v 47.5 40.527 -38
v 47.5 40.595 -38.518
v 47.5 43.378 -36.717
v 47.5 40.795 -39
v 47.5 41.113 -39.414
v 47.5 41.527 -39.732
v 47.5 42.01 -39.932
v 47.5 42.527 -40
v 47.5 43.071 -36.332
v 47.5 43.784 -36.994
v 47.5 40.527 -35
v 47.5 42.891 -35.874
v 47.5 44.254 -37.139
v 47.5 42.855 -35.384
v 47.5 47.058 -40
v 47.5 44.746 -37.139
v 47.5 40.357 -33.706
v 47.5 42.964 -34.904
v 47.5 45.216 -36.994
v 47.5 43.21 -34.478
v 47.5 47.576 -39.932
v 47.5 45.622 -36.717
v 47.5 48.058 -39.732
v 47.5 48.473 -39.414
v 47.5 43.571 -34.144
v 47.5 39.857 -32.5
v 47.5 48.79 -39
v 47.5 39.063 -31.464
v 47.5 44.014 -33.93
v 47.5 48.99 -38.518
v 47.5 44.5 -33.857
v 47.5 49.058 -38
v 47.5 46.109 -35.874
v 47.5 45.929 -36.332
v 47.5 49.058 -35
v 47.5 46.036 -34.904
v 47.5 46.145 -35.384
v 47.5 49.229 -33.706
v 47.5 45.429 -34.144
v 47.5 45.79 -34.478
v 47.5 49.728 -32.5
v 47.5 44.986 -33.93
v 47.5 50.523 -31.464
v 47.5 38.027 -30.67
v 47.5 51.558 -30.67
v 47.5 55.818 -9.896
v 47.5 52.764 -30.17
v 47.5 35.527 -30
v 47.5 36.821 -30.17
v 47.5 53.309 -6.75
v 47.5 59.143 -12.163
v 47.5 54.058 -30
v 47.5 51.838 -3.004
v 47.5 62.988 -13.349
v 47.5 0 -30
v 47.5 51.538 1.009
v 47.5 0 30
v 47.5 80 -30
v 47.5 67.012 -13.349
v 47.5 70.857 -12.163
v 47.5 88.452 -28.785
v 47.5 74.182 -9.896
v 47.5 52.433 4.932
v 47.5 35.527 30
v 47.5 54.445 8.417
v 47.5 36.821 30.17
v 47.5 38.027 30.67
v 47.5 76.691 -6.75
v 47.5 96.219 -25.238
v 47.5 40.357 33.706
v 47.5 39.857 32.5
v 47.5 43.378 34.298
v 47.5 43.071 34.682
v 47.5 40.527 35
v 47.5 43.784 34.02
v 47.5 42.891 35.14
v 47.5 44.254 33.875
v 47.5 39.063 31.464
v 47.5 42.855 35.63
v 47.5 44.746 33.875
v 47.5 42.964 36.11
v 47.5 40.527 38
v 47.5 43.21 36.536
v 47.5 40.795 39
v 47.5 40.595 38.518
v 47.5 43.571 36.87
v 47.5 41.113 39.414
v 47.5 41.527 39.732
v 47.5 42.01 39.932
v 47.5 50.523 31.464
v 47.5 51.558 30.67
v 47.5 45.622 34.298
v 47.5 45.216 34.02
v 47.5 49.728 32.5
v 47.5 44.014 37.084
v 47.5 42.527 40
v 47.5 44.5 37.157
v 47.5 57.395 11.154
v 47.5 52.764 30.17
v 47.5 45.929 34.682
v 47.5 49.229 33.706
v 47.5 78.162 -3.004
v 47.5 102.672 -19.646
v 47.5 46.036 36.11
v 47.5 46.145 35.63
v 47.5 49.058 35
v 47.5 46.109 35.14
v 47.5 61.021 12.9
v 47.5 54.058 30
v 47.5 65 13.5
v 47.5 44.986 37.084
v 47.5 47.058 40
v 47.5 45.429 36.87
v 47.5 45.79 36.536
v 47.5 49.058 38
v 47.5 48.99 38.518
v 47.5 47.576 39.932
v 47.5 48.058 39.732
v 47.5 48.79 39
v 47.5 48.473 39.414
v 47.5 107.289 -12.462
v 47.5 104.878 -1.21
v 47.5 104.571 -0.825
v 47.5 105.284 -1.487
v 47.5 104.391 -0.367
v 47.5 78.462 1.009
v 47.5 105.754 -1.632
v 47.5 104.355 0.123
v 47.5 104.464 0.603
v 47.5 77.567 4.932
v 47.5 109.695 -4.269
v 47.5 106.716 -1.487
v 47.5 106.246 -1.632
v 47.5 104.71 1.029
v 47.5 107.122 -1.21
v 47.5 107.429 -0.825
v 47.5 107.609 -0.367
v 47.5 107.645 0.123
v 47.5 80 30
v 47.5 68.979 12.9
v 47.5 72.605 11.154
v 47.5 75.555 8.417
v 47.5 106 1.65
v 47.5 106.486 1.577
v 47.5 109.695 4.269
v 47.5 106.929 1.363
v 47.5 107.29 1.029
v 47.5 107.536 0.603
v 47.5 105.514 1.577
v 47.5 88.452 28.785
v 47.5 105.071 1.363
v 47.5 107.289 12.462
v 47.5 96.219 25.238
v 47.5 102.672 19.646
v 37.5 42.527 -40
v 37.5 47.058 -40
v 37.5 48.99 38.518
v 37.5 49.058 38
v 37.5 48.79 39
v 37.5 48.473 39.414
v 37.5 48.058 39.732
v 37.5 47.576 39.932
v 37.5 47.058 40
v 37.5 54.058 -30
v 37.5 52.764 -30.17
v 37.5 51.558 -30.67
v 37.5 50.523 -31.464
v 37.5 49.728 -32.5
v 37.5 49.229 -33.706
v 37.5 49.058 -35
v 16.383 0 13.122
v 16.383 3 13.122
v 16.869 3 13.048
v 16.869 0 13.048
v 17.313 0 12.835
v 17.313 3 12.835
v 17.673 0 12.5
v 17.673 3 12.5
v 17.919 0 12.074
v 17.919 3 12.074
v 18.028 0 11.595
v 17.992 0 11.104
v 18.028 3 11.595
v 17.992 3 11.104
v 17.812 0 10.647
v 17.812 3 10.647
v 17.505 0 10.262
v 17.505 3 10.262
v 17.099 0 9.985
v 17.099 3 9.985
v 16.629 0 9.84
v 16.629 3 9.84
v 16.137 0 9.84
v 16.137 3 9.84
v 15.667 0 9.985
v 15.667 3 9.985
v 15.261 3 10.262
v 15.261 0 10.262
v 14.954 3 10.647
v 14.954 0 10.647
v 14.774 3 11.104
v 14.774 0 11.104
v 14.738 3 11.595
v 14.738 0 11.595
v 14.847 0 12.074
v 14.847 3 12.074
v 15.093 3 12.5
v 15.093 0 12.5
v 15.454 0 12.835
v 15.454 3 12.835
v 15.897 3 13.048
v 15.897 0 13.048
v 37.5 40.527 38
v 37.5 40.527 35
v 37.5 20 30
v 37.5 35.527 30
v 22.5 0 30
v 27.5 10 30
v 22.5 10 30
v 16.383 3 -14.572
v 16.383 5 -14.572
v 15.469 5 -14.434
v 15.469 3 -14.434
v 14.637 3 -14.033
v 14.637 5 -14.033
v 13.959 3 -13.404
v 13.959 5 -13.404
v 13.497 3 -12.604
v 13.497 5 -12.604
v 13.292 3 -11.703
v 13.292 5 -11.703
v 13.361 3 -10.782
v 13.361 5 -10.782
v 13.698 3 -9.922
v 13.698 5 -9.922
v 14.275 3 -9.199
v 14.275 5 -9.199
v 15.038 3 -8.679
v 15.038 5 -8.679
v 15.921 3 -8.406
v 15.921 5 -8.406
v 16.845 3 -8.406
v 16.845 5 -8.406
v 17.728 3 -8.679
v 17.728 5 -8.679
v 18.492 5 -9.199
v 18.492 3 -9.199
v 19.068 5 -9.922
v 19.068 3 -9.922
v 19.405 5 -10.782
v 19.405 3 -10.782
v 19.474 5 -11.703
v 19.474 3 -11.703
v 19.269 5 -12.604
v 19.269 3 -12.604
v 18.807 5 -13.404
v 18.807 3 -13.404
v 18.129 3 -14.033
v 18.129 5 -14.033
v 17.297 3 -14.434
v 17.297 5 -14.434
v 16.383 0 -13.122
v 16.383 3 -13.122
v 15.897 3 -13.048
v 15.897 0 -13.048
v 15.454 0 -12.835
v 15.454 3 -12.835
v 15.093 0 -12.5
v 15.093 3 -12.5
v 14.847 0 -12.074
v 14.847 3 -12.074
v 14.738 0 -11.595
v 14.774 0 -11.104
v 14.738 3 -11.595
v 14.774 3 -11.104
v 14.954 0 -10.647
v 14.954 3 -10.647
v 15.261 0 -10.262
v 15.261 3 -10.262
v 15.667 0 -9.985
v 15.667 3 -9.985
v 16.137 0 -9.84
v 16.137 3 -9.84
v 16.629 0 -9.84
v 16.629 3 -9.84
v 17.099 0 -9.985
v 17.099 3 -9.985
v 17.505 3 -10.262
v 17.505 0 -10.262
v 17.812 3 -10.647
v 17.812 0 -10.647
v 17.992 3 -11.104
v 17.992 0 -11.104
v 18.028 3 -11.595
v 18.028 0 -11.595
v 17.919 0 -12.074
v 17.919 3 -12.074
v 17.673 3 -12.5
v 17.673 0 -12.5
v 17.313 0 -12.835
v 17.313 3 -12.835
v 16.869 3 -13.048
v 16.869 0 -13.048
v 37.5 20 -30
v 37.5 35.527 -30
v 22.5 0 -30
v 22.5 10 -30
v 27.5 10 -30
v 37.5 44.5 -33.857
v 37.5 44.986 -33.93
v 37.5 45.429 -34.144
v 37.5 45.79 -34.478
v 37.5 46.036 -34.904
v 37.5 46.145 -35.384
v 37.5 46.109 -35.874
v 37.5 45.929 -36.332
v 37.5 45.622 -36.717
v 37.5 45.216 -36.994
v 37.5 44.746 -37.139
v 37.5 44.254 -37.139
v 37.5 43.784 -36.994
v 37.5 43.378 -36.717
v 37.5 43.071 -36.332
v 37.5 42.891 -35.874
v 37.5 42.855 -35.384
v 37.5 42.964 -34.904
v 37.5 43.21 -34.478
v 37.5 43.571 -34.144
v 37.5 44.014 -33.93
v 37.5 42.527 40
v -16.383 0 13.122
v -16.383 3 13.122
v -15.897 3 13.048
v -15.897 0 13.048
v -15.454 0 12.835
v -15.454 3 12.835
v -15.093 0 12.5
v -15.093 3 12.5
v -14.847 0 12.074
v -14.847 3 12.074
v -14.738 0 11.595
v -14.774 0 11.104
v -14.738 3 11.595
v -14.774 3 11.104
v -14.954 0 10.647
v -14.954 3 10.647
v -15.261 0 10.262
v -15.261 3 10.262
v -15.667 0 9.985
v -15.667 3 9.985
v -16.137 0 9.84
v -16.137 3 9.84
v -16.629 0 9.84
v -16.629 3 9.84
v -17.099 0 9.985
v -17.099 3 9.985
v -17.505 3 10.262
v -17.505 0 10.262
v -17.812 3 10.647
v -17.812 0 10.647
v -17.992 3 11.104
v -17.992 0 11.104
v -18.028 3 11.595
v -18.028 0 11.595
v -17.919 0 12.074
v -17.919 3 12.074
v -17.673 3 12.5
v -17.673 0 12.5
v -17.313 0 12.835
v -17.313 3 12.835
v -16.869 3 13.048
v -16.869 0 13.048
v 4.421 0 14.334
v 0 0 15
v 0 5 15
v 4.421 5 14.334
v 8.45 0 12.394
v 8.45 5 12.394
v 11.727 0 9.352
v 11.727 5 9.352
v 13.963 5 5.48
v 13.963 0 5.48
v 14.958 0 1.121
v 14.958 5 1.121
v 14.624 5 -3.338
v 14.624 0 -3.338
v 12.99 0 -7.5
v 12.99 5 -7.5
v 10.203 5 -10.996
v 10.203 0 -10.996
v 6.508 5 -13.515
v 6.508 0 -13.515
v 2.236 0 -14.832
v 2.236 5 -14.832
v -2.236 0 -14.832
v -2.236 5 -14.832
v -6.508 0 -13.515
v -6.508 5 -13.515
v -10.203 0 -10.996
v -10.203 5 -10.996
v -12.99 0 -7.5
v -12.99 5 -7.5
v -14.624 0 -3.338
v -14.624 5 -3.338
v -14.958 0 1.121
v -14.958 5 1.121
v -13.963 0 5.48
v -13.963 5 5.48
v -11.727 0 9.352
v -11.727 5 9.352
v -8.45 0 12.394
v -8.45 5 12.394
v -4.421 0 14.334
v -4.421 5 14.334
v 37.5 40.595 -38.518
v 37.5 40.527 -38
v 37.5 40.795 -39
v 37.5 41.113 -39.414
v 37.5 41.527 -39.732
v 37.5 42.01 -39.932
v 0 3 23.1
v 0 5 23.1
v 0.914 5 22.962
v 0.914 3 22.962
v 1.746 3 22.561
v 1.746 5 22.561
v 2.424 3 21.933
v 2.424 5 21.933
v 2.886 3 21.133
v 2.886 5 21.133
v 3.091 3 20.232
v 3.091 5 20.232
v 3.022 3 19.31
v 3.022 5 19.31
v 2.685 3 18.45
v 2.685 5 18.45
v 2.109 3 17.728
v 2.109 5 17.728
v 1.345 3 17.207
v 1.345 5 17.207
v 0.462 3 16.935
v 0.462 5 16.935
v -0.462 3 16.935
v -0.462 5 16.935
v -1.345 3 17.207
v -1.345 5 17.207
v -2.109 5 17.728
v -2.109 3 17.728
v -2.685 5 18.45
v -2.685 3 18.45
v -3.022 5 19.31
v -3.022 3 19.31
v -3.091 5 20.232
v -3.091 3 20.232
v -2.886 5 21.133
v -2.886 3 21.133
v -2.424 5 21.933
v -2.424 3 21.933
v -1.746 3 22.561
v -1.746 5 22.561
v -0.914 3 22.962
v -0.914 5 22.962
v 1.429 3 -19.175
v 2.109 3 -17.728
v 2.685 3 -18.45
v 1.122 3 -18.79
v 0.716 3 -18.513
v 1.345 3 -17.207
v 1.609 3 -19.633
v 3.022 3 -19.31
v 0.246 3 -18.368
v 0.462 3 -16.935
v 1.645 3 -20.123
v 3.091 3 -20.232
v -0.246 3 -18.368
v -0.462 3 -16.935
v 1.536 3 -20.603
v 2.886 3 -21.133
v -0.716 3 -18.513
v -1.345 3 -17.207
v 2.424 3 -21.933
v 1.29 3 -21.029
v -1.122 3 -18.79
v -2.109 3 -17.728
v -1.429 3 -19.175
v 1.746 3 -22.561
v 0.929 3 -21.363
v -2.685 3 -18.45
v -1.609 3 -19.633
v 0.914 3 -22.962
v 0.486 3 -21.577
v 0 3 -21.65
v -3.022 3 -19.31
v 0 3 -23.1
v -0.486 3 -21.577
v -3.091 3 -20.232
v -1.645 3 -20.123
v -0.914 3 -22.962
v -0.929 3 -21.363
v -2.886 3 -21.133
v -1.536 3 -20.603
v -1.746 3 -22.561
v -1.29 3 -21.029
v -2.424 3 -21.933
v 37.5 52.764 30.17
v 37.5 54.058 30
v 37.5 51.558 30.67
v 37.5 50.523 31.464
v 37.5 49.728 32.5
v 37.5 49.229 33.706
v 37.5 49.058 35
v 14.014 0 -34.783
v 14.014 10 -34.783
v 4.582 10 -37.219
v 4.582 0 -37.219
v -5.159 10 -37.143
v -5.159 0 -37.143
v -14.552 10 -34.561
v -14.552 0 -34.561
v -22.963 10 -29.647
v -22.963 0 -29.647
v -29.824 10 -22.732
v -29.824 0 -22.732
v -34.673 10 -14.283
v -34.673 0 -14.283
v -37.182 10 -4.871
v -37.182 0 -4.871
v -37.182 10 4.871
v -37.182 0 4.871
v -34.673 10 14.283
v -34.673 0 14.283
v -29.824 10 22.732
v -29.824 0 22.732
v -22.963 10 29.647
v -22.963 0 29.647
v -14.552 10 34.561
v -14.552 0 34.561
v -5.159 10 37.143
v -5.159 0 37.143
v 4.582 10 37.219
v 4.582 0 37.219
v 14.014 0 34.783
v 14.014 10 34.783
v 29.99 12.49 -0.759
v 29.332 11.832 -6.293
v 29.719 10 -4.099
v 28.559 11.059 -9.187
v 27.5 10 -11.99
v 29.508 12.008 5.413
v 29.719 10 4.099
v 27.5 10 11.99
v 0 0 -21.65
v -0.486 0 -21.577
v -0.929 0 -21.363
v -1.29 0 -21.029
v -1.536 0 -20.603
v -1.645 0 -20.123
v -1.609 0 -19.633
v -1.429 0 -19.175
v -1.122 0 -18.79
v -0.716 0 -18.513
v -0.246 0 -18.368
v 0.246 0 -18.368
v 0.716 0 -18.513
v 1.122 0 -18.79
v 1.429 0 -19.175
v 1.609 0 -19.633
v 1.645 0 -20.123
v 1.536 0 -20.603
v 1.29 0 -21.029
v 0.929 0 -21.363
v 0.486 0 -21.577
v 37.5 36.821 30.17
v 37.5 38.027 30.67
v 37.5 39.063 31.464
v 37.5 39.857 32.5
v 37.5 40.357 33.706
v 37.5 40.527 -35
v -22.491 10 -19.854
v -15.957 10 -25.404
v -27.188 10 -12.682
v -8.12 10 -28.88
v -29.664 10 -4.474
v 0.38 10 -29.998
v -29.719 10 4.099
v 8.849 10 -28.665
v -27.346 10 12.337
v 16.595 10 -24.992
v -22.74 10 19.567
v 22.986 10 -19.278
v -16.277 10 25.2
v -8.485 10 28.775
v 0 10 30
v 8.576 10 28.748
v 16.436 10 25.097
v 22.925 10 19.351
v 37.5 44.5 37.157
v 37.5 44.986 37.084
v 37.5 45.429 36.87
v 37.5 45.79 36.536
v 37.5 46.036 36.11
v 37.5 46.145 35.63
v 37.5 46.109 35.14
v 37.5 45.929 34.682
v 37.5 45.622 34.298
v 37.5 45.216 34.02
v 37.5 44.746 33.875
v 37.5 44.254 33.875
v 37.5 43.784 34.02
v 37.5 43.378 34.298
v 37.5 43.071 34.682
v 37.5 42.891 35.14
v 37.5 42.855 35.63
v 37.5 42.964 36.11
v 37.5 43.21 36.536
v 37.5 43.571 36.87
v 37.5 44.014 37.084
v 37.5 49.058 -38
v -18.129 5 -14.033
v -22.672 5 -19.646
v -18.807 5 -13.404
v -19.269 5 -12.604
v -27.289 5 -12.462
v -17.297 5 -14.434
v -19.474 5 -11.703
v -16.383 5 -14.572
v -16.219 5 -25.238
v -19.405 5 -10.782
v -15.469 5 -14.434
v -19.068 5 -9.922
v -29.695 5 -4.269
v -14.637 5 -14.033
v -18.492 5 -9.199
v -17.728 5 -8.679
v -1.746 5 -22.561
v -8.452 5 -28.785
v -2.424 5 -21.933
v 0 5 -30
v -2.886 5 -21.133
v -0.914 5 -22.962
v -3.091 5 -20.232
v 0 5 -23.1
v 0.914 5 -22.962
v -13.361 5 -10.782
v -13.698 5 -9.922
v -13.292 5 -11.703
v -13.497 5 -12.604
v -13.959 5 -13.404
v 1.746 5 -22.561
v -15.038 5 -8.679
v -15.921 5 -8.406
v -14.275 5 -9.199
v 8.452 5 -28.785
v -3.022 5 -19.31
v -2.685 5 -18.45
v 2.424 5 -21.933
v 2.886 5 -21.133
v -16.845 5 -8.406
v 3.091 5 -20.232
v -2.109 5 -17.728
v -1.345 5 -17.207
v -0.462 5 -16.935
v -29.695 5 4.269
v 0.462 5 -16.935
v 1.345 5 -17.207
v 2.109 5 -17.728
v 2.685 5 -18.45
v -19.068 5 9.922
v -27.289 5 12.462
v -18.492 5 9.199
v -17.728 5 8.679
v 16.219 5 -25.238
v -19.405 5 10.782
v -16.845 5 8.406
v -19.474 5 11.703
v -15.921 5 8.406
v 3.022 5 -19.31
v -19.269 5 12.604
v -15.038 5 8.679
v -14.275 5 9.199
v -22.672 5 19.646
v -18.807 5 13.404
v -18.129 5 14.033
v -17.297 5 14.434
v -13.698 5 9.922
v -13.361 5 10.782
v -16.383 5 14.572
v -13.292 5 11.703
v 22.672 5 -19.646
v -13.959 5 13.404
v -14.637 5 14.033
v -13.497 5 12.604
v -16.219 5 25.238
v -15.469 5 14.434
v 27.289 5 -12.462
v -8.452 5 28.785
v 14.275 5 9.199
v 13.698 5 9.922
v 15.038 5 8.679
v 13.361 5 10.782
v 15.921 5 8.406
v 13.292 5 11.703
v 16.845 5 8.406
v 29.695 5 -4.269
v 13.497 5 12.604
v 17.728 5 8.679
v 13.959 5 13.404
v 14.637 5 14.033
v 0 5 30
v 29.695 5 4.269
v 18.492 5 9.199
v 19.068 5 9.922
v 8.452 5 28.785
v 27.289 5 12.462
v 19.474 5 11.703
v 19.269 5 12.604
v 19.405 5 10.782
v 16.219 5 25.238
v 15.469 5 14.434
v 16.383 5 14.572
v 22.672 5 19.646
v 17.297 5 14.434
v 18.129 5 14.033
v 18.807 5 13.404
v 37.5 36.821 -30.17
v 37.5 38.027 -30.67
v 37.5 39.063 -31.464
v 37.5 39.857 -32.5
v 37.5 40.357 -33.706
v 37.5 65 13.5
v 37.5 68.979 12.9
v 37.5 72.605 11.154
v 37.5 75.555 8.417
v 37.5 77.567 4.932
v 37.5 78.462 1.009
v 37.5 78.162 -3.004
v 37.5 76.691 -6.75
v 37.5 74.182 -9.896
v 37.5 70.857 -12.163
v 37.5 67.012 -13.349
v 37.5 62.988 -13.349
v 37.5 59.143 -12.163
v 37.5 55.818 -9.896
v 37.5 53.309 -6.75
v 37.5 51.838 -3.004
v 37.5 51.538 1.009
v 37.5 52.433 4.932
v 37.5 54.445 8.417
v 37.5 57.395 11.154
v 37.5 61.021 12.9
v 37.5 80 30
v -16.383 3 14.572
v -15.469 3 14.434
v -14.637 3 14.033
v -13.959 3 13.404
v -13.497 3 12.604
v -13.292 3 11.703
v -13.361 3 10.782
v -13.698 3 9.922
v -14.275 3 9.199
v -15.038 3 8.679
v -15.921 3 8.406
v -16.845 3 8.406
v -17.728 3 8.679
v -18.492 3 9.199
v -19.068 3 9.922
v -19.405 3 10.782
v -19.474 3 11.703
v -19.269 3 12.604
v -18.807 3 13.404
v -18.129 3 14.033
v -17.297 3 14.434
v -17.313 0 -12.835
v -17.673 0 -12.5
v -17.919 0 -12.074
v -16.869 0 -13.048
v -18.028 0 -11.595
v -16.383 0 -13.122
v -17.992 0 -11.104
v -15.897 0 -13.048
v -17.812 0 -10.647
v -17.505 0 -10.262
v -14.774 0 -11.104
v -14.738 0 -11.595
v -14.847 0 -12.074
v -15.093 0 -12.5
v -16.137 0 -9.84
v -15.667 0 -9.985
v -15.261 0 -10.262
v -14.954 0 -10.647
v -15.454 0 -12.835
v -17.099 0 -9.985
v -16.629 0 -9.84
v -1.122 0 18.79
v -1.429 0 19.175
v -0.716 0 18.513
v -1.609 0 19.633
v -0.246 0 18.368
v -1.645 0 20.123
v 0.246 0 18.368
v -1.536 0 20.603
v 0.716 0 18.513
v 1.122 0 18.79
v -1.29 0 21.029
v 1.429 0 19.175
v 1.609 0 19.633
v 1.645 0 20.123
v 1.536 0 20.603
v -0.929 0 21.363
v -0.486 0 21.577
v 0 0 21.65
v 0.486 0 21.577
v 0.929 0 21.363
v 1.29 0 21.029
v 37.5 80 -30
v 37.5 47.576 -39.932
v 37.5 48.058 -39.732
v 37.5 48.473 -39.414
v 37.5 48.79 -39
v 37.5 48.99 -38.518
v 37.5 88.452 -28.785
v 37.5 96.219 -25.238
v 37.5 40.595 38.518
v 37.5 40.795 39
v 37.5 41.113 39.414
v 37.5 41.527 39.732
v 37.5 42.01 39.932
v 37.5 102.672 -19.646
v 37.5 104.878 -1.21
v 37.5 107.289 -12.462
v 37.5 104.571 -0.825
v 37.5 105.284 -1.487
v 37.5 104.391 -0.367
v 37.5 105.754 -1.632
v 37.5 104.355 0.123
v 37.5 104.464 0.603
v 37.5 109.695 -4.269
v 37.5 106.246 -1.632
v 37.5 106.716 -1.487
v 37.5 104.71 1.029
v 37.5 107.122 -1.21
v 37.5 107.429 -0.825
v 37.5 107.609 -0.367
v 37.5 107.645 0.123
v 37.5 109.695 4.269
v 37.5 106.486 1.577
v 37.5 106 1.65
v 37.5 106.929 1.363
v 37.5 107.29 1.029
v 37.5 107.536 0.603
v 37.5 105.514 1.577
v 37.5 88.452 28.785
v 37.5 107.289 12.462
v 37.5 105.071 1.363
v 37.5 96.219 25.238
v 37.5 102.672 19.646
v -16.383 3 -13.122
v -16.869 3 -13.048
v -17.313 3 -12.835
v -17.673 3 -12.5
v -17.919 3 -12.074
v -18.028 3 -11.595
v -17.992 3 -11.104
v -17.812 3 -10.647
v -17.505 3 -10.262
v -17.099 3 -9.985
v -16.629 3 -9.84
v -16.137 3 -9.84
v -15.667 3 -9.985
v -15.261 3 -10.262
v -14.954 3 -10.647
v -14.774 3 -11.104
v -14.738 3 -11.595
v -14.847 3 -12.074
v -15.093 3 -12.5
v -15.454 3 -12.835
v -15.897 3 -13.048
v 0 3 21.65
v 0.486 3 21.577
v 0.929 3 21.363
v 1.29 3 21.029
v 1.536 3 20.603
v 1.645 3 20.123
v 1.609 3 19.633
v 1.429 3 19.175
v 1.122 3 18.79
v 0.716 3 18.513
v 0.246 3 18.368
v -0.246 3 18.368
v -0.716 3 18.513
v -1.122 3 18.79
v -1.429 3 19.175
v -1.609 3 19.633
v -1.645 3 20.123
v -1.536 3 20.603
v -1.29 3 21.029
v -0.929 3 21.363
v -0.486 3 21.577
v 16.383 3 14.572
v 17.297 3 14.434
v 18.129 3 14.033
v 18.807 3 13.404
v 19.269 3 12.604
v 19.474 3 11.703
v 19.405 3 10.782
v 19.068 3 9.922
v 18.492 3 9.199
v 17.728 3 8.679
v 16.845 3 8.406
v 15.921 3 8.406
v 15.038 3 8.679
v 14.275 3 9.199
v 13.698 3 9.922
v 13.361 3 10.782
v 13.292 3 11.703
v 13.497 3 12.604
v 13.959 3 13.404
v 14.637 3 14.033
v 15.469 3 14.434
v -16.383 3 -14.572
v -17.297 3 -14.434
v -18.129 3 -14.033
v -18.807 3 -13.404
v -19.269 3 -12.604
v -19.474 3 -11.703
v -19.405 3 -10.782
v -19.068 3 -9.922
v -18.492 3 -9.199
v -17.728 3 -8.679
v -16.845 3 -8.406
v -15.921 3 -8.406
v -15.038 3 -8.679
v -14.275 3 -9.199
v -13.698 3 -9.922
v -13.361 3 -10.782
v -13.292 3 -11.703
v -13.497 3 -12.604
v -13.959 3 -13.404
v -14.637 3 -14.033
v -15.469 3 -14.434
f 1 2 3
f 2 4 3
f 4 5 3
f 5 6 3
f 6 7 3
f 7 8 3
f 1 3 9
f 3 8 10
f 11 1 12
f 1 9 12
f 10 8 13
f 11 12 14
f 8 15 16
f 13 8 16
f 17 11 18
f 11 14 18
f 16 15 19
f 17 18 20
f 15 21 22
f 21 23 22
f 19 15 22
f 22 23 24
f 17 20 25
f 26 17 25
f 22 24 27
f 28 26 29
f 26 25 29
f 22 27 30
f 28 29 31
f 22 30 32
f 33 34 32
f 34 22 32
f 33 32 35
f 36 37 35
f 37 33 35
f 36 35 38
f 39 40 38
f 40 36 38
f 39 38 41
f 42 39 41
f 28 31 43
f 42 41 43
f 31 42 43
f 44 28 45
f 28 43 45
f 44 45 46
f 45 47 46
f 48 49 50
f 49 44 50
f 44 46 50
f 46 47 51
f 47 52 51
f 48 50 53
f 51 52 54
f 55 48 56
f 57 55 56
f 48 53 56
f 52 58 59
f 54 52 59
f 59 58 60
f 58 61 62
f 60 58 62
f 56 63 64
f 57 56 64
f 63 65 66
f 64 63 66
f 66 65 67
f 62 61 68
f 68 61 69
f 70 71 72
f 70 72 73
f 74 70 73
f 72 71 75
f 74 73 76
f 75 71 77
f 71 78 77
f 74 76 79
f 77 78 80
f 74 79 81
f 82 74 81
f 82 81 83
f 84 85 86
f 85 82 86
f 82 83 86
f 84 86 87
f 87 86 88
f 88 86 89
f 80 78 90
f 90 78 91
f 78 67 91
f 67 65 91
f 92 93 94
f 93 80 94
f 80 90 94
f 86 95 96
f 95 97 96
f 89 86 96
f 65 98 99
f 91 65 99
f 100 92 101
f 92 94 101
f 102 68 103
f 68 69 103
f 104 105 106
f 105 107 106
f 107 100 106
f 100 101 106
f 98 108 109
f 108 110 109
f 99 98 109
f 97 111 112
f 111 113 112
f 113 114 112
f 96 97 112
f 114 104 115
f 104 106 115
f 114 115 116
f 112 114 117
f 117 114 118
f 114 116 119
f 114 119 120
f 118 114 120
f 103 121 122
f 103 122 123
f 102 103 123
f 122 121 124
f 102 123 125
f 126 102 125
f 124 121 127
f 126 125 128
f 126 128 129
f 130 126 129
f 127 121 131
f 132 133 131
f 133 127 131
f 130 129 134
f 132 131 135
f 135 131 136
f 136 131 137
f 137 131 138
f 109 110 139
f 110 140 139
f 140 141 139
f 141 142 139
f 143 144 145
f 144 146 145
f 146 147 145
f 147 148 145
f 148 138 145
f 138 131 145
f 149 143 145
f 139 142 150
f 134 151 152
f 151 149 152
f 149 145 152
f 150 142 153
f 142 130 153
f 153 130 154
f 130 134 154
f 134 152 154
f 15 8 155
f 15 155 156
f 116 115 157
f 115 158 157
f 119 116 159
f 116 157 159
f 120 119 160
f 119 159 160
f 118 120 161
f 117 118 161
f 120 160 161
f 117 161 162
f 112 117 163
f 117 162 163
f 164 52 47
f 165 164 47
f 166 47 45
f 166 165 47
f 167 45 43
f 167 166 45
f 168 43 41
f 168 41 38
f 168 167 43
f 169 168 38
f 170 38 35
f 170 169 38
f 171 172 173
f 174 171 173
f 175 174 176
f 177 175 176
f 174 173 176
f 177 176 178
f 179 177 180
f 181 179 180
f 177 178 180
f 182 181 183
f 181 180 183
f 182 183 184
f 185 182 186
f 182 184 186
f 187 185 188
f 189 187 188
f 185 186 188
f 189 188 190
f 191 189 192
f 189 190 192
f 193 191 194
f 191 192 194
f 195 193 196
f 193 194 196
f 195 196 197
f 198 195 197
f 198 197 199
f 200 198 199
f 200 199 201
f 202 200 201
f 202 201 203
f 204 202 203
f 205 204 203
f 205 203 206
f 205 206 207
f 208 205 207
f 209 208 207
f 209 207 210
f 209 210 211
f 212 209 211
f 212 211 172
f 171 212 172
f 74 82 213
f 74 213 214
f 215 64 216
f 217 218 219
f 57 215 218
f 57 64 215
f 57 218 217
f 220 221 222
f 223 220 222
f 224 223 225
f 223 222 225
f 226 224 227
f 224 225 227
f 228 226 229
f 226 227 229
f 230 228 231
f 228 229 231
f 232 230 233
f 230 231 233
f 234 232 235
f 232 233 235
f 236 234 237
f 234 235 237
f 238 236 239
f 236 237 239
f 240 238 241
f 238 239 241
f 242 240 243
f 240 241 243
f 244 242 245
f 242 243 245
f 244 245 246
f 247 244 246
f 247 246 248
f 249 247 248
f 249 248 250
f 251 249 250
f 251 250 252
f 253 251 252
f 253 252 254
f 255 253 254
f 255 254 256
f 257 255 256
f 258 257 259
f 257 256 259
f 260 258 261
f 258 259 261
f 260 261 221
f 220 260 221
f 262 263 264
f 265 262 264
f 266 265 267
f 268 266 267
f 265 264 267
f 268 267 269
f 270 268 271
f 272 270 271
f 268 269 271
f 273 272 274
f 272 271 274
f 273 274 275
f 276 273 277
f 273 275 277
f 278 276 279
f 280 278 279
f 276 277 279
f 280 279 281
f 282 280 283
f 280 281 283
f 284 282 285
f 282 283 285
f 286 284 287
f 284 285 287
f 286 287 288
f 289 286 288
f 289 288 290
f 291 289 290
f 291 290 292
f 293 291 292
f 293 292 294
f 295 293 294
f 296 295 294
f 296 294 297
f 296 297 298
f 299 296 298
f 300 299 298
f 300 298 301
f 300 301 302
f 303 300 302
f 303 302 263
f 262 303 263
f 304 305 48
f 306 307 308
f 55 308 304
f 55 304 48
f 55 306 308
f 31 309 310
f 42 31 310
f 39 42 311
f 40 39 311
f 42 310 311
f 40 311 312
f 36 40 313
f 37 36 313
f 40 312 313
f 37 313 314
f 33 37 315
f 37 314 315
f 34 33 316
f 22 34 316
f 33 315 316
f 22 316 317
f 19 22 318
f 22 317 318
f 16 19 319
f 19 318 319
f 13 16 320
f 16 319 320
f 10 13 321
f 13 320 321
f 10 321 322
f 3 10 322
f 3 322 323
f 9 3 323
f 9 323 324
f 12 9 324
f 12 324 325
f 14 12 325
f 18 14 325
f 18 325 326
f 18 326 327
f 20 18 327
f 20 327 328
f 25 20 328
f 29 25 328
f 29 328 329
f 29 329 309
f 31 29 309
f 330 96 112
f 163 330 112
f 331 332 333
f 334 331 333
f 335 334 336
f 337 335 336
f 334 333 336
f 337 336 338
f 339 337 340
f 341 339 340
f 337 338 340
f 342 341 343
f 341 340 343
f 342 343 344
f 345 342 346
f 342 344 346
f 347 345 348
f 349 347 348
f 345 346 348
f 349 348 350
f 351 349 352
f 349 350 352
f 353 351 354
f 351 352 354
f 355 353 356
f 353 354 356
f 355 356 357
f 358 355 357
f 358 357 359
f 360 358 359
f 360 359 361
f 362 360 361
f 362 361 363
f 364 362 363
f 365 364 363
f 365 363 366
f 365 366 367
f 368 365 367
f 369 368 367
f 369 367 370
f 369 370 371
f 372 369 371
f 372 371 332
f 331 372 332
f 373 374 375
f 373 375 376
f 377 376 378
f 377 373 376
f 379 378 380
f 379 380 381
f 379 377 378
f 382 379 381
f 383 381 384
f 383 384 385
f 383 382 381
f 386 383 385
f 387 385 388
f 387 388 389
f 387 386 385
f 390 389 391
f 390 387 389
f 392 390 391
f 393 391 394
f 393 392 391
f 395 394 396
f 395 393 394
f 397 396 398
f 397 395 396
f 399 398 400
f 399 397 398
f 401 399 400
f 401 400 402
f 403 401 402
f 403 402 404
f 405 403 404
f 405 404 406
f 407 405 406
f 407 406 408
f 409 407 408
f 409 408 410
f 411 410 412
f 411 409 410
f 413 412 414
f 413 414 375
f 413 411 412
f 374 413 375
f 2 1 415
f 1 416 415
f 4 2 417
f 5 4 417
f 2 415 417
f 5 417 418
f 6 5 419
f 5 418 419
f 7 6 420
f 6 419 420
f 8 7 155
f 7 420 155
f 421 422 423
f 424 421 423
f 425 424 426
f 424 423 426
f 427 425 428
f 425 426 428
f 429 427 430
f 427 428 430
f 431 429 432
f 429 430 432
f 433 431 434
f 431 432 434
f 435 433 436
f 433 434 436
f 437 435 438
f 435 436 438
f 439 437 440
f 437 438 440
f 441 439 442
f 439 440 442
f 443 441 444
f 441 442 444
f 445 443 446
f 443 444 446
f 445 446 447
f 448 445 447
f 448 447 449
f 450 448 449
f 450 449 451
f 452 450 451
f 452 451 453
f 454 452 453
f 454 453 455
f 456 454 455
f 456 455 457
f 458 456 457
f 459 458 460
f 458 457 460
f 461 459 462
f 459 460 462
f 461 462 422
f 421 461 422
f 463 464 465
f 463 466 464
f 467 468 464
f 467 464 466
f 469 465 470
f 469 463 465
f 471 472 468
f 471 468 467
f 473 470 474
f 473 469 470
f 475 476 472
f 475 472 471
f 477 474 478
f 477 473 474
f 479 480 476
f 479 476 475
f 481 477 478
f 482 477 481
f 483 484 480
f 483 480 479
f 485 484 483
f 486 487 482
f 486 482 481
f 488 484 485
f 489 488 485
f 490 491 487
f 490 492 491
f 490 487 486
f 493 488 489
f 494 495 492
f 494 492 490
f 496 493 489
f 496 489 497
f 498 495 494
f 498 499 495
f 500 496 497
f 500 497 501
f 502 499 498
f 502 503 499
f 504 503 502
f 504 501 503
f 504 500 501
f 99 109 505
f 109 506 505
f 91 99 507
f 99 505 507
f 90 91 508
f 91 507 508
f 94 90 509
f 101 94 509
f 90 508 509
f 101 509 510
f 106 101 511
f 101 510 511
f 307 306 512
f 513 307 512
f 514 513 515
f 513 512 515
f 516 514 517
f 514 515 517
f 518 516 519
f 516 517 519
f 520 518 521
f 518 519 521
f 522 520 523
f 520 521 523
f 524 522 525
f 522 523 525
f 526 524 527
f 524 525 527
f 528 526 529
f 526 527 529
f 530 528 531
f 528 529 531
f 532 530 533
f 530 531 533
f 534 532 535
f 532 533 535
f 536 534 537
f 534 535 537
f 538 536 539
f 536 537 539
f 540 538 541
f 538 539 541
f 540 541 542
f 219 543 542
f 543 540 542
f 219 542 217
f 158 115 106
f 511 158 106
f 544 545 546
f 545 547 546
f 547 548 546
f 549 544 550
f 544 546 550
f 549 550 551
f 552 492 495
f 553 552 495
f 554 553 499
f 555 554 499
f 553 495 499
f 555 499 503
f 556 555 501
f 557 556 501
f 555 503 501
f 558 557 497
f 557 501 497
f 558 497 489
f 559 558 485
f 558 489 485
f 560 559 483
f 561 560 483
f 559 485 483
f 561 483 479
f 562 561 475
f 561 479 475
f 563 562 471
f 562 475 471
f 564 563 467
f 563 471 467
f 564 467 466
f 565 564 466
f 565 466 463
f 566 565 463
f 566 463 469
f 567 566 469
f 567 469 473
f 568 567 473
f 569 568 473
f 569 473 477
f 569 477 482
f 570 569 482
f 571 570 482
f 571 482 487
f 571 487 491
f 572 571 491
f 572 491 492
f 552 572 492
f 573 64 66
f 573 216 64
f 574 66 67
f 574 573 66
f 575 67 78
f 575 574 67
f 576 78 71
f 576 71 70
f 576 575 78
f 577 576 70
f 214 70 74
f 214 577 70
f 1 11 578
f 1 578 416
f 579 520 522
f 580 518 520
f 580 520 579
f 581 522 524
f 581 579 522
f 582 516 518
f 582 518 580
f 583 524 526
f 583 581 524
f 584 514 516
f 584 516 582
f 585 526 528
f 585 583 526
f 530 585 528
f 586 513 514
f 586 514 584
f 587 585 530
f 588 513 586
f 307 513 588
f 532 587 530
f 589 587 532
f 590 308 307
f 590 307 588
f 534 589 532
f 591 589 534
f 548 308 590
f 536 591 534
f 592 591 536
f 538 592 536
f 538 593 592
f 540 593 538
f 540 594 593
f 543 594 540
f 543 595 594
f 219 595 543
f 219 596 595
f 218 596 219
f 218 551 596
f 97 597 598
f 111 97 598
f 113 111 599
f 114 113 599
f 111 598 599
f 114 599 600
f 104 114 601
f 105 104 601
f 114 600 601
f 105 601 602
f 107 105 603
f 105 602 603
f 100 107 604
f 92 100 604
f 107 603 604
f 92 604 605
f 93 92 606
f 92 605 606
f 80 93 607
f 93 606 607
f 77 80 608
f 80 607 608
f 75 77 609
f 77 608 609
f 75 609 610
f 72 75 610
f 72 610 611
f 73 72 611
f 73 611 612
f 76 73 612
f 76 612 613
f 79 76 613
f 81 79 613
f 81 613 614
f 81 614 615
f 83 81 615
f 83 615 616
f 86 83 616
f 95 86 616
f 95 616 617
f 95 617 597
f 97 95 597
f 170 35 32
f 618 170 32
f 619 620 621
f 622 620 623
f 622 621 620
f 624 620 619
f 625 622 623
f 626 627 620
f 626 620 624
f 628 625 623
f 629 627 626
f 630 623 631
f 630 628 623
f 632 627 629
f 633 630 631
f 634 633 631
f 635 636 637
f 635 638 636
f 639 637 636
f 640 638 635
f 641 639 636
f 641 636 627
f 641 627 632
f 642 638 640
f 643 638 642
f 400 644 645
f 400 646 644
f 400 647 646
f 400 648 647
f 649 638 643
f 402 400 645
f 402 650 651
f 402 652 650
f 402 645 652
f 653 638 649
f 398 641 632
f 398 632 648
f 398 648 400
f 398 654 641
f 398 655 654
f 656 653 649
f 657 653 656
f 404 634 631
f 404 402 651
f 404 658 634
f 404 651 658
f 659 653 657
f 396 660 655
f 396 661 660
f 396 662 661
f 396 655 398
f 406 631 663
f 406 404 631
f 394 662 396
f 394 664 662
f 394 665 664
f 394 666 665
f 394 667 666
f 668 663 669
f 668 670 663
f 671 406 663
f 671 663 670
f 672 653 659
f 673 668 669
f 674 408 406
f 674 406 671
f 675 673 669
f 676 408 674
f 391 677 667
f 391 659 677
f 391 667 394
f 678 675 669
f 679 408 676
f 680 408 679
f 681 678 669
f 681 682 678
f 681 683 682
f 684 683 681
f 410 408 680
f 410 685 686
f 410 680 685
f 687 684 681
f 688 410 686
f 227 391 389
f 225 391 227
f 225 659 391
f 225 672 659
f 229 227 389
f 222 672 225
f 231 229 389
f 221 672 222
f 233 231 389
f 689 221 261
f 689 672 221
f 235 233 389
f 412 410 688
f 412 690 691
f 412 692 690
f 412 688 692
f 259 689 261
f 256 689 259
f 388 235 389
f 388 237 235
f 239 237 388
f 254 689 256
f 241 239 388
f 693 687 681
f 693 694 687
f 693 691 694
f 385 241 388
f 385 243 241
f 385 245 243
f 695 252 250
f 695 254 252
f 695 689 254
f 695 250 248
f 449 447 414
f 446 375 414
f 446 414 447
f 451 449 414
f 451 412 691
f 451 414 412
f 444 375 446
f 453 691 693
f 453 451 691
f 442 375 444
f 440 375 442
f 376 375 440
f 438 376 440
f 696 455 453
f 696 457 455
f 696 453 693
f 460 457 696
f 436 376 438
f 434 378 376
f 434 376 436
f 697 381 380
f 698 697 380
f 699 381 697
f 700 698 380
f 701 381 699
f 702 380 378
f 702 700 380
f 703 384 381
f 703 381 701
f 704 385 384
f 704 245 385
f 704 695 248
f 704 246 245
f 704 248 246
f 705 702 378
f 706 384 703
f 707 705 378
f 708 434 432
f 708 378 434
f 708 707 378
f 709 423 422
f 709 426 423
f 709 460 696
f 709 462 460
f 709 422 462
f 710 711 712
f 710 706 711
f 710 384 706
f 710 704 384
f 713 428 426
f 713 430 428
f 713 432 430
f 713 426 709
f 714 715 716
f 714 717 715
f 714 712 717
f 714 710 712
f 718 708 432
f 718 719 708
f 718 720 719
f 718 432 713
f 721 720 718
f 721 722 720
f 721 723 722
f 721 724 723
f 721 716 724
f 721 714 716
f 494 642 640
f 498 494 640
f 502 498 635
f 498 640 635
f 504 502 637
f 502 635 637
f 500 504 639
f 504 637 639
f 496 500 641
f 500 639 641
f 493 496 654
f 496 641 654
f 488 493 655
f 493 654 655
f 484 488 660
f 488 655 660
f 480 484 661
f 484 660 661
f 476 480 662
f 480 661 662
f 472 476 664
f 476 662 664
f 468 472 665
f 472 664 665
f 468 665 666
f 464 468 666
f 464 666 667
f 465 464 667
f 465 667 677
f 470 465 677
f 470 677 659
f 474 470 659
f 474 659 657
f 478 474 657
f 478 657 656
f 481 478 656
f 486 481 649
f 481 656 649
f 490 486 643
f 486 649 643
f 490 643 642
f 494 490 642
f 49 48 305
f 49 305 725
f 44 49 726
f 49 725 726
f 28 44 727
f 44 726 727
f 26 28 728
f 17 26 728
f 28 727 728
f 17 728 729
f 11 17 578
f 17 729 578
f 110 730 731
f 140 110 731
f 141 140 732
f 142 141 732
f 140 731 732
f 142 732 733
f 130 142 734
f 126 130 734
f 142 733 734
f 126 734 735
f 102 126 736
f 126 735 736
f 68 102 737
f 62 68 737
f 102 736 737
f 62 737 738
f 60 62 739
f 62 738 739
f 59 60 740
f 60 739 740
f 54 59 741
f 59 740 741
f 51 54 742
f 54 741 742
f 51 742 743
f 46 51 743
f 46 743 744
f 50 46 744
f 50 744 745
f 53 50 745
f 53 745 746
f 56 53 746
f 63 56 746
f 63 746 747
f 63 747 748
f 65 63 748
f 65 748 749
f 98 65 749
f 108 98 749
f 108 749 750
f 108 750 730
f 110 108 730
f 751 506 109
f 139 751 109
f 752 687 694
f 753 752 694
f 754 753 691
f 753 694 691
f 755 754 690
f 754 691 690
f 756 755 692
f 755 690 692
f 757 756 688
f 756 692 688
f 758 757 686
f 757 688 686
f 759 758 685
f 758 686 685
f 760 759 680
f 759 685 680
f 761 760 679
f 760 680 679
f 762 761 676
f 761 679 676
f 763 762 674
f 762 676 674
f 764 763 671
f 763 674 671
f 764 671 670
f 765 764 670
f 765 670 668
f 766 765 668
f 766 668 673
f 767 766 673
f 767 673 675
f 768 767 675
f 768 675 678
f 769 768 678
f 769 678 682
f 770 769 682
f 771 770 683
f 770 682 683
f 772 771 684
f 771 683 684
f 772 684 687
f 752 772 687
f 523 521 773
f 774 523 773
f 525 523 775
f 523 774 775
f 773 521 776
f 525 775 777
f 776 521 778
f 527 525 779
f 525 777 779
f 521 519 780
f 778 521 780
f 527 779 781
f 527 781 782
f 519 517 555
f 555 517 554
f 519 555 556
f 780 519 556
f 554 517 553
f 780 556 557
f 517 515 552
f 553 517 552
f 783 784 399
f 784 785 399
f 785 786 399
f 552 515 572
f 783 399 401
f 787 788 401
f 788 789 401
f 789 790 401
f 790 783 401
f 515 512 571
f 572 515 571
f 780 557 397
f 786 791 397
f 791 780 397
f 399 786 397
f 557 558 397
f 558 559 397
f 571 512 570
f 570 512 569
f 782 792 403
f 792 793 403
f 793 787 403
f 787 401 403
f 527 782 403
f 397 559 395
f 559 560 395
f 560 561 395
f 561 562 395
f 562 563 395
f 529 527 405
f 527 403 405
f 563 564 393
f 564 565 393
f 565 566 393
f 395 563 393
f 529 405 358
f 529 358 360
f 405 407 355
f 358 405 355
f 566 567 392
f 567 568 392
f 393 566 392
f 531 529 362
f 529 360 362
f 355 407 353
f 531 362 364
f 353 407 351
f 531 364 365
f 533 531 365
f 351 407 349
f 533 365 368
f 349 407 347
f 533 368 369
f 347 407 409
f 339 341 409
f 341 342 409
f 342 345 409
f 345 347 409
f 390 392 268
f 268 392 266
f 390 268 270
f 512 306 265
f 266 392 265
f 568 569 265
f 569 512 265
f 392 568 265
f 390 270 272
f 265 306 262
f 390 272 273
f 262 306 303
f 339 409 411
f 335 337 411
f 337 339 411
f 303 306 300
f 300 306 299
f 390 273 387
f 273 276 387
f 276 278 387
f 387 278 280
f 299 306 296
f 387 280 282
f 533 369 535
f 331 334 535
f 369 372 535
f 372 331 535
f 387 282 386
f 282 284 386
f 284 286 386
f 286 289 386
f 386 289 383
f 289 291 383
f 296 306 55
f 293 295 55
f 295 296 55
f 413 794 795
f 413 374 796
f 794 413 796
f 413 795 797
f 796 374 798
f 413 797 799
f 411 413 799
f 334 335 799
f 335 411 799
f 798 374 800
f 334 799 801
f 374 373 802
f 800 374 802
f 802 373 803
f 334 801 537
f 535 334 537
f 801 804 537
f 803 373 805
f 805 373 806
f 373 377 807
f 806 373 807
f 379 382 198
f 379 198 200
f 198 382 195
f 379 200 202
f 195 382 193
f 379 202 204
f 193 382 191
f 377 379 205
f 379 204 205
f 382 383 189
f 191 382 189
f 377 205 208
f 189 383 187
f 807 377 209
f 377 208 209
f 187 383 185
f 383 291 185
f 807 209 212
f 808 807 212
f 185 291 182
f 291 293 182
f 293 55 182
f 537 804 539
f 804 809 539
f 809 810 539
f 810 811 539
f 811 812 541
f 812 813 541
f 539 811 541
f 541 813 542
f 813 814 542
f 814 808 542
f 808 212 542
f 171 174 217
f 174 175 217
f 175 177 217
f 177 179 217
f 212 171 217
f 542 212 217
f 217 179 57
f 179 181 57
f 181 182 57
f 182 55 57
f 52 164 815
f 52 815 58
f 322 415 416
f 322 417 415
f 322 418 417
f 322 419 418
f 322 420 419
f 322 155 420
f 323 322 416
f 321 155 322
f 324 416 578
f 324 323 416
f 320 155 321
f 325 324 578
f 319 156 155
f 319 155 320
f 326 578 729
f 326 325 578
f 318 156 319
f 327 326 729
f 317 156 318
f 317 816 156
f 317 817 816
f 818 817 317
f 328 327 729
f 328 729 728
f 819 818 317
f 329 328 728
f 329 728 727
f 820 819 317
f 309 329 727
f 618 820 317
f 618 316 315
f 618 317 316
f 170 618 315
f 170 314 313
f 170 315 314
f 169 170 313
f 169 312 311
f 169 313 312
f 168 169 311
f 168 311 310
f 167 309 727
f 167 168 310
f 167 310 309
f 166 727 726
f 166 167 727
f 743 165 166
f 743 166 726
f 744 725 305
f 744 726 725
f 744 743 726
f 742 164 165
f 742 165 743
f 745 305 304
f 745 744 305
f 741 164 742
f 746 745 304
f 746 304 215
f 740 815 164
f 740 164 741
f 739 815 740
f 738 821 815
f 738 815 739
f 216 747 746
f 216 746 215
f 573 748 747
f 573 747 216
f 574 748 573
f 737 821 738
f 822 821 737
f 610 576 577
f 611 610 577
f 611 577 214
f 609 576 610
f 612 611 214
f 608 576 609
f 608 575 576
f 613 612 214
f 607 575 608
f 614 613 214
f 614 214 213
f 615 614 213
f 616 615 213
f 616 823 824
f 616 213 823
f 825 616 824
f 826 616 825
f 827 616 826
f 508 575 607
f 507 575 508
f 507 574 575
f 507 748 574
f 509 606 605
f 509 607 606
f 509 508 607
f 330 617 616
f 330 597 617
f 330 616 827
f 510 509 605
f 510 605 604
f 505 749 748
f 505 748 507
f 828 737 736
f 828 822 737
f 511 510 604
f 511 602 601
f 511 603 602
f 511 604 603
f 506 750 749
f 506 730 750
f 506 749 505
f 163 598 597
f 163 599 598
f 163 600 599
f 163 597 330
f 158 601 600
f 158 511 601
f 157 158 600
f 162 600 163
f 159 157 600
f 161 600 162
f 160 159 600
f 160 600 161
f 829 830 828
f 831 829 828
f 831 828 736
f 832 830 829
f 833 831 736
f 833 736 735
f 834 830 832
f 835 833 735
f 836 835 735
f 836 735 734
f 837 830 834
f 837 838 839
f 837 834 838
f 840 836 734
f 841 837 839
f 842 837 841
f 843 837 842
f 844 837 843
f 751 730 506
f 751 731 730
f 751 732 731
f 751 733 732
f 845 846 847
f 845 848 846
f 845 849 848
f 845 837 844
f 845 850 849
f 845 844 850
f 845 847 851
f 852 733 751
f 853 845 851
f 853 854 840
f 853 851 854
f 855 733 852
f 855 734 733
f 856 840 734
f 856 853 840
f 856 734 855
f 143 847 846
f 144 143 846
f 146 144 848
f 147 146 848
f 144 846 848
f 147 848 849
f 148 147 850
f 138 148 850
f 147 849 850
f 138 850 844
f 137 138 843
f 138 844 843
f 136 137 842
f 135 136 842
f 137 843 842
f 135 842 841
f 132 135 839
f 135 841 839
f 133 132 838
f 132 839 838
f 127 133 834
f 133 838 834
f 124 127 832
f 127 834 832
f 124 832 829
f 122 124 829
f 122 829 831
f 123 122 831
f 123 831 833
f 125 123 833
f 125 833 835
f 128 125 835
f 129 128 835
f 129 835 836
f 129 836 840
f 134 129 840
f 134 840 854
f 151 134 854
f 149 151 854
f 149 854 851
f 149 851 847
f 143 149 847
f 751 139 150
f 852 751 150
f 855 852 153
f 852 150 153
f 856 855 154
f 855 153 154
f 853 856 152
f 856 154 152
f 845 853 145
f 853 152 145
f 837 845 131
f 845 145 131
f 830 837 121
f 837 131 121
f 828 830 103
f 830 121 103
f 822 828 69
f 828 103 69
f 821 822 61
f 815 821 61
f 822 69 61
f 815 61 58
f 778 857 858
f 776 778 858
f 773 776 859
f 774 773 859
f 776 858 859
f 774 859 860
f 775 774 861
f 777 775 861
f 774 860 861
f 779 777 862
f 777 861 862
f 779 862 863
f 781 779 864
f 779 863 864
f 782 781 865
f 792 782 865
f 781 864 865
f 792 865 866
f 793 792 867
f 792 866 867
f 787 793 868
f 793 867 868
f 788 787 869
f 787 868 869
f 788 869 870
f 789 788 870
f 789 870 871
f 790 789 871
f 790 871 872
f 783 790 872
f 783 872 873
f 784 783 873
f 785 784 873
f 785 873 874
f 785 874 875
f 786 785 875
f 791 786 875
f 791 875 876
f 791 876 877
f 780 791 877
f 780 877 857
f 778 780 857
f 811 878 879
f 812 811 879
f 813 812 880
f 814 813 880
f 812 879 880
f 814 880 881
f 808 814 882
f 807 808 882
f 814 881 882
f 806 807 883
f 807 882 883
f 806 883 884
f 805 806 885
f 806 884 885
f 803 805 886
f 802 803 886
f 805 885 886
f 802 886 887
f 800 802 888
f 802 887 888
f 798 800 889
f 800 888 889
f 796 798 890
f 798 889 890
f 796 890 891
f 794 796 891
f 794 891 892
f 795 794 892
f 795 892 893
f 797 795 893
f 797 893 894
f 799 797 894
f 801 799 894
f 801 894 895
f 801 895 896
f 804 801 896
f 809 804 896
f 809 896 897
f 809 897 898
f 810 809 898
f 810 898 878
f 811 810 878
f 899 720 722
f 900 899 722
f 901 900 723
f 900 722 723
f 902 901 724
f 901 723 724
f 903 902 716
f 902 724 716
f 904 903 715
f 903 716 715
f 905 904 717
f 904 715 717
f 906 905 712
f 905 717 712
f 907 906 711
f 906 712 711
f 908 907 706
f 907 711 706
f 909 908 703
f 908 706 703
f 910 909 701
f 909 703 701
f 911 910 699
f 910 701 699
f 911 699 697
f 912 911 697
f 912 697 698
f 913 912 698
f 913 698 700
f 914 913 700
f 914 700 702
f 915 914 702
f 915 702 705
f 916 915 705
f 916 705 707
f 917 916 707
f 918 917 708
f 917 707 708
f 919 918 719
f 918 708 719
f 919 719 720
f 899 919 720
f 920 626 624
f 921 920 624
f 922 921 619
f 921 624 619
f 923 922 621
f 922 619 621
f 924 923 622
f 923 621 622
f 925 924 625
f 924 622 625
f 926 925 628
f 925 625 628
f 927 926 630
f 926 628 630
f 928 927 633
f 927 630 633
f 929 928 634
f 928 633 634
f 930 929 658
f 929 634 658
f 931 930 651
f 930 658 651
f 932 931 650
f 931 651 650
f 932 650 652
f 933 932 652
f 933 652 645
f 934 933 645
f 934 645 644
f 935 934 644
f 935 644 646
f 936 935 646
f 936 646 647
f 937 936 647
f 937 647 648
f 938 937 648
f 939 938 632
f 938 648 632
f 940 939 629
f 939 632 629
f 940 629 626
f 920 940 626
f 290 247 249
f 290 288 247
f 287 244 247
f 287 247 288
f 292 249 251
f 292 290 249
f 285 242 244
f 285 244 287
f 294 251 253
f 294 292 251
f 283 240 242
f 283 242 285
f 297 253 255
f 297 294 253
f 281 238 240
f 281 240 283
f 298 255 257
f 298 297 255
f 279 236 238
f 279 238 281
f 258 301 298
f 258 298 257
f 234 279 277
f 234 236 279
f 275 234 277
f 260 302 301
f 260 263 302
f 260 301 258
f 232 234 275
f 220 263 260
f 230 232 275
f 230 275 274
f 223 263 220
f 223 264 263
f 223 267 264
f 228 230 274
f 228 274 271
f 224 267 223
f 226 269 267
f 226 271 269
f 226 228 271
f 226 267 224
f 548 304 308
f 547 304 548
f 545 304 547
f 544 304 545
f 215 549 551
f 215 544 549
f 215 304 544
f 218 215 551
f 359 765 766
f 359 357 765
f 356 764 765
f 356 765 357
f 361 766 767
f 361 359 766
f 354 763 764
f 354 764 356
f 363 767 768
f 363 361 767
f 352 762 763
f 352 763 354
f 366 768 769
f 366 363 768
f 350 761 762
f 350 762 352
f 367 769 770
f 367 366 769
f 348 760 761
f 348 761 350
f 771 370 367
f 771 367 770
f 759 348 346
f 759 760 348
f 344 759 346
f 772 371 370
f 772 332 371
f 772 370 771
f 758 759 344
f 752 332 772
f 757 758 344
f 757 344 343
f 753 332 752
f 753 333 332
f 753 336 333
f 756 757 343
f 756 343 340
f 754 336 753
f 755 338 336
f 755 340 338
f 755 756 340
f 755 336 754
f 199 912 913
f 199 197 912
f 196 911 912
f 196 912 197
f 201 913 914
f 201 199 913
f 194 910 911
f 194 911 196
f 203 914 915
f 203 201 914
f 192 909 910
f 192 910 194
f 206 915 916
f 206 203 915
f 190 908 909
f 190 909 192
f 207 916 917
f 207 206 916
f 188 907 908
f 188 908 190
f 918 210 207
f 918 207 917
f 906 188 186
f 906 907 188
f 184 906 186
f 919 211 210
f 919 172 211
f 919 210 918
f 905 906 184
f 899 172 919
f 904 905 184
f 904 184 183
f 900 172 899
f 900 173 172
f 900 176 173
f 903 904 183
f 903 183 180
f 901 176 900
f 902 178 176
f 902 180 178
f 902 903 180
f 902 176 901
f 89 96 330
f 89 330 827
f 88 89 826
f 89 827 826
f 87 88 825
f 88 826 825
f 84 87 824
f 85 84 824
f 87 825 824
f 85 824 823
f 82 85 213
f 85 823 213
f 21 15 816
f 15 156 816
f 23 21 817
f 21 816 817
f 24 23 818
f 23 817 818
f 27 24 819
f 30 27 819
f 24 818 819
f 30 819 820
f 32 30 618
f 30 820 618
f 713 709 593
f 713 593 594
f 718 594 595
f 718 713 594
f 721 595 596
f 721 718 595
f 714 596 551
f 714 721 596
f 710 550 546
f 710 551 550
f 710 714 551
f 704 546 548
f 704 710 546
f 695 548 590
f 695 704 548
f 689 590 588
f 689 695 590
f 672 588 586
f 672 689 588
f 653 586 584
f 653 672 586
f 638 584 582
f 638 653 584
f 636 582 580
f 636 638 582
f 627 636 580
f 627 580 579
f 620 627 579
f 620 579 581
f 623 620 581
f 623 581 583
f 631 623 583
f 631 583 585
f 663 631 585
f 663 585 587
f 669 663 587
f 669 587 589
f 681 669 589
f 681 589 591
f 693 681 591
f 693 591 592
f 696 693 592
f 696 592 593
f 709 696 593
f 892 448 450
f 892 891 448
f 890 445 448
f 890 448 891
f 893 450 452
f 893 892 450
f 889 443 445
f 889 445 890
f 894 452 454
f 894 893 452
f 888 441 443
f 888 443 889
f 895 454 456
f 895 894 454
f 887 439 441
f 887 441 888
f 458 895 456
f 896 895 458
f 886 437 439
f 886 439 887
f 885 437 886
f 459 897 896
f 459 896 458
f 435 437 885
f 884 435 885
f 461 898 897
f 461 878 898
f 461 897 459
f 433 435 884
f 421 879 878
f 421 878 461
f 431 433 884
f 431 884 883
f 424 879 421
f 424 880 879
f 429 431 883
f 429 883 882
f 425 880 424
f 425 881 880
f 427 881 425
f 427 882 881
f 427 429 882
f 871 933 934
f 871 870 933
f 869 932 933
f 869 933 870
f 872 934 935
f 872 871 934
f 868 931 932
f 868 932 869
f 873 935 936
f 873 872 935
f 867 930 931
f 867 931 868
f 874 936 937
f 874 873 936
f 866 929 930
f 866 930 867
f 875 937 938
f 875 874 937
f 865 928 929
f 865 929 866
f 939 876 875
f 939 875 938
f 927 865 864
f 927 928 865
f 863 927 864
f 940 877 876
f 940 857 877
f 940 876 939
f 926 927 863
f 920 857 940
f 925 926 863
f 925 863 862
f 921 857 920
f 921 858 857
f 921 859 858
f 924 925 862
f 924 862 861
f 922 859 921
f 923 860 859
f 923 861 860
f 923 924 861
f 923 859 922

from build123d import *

# Parameters (mm, degrees)
SKETCH1_R           = 37.5
SKETCH1_R_2         = 15
BOSS_EXTRUDE1_DEPTH = 5
SKETCH2_R           = 37.5
SKETCH2_R_2         = 30
BOSS_EXTRUDE2_DEPTH = 5
SKETCH3_R           = 1.65
CUT_EXTRUDE1_DEPTH  = 54.268189382
SKETCH4_R           = 3.1
CUT_EXTRUDE2_DEPTH  = 2
BOSS_EXTRUDE3_DEPTH = 10
SKETCH6_W           = 10
SKETCH6_H           = 60
BOSS_EXTRUDE4_DEPTH = 70
SKETCH7_R           = 13.5
CUT_EXTRUDE3_DEPTH  = 70
BOSS_EXTRUDE6_DEPTH = 10
SKETCH12_W          = 10
SKETCH12_H          = 8.531115437
BOSS_EXTRUDE7_DEPTH = 10
FILLET2_R           = 5
SKETCH10_R          = 1.65
CUT_EXTRUDE5_DEPTH  = 15
CHAMFER1_SIZE       = 10
FILLET3_R           = 2


# Read off the part's stored shape, not the designer's step: Boss-Extrude3
with BuildPart() as part:
    # Sketch1 → Boss-Extrude1 (new body)
    with BuildSketch(Plane(origin=(0, 0, 0), x_dir=(1, 0, 0), z_dir=(0, 1, 0))):
        with Locations(Location((0, 0, 0), (0, 0, 270))):
            Circle(SKETCH1_R)
        with Locations(Location((0, 0, 0), (0, 0, 270))):
            Circle(SKETCH1_R_2, mode=Mode.SUBTRACT)
    extrude(amount=BOSS_EXTRUDE1_DEPTH)

    # Sketch2 → Boss-Extrude2 (add)
    with BuildSketch(Plane(origin=(0, 5, 0), x_dir=(1, 0, 0), z_dir=(0, 1, 0))):
        with Locations(Location((0, 0, 0), (0, 0, 270))):
            Circle(SKETCH2_R)
        with Locations(Location((0, 0, 0), (0, 0, 270))):
            Circle(SKETCH2_R_2, mode=Mode.SUBTRACT)
    extrude(amount=BOSS_EXTRUDE2_DEPTH)

    # Sketch3 → Cut-Extrude1 (cut, through all)
    with BuildSketch(Plane(origin=(0, 5, 0), x_dir=(1, 0, 0), z_dir=(0, 1, 0))):
        with Locations(Location((0, -20, 0), (0, 0, 270))):
            Circle(SKETCH3_R)
        with Locations(Location((16.383040886, -11.471528727, 0), (0, 0, 270))):
            Circle(SKETCH3_R)
        with Locations(Location((-16.383040886, -11.471528727, 0), (0, 0, 270))):
            Circle(SKETCH3_R)
        with Locations(Location((-16.383040886, 11.471528727, 0), (0, 0, 90))):
            Circle(SKETCH3_R)
        with Locations(Location((0, 20, 0), (0, 0, 90))):
            Circle(SKETCH3_R)
        with Locations(Location((16.383040886, 11.471528727, 0), (0, 0, 90))):
            Circle(SKETCH3_R)
    extrude(amount=-CUT_EXTRUDE1_DEPTH, mode=Mode.SUBTRACT)

    # Sketch4 → Cut-Extrude2 (cut)
    with BuildSketch(Plane(origin=(0, 5, 0), x_dir=(1, 0, 0), z_dir=(0, 1, 0))):
        with Locations(Location((0, -20, 0), (0, 0, 270))):
            Circle(SKETCH4_R)
        with Locations(Location((16.383040886, -11.471528727, 0), (0, 0, 270))):
            Circle(SKETCH4_R)
        with Locations(Location((-16.383040886, -11.471528727, 0), (0, 0, 270))):
            Circle(SKETCH4_R)
        with Locations(Location((-16.383040886, 11.471528727, 0), (0, 0, 90))):
            Circle(SKETCH4_R)
        with Locations(Location((16.383040886, 11.471528727, 0), (0, 0, 90))):
            Circle(SKETCH4_R)
        with Locations(Location((0, 20, 0), (0, 0, 90))):
            Circle(SKETCH4_R)
    extrude(amount=-CUT_EXTRUDE2_DEPTH, mode=Mode.SUBTRACT)

    # Boss-Extrude3 outline → Boss-Extrude3 (add)
    with BuildSketch(Plane(origin=(0, 0, 0), x_dir=(1, 0, 0), z_dir=(0, 1, 0))):
        with BuildLine():
            Line((22.5, -30), (47.5, -30))
            Line((47.5, -30), (47.5, 30))
            Line((47.5, 30), (22.5, 30))
            ThreePointArc((22.5, 30), (37.5, 0), (22.5, -30))
        make_face()
    extrude(amount=BOSS_EXTRUDE3_DEPTH)

    # Sketch6 → Boss-Extrude4 (add)
    with BuildSketch(Plane(origin=(0, 10, 0), x_dir=(1, 0, 0), z_dir=(0, 1, 0))):
        with Locations((42.5, 0)):
            Rectangle(SKETCH6_W, SKETCH6_H)
    extrude(amount=BOSS_EXTRUDE4_DEPTH)

    # Sketch7 → Cut-Extrude3 (cut)
    with BuildSketch(Plane.ZY.offset(-37.5)):
        with Locations((0, 65)):
            Circle(SKETCH7_R)
    extrude(amount=-CUT_EXTRUDE3_DEPTH, mode=Mode.SUBTRACT)

    # Sketch9 → Boss-Extrude6 (add)
    with BuildSketch(Plane(origin=(47.5, 0, 0), x_dir=(0, 0, -1), z_dir=(1, 0, 0))):
        with BuildLine():
            ThreePointArc((-30, 80), (0, 110), (30, 80))
            Line((30, 80), (-30, 80))
        make_face()
    extrude(amount=-BOSS_EXTRUDE6_DEPTH)

    # Sketch12 → Boss-Extrude7 (add)
    with BuildSketch(Plane(origin=(47.5, 0, 0), x_dir=(0, 0, -1), z_dir=(1, 0, 0))):
        with Locations((-35, 44.792740579)):
            Rectangle(SKETCH12_W, SKETCH12_H)
        with Locations((35, 44.792740579)):
            Rectangle(SKETCH12_W, SKETCH12_H)
    extrude(amount=-BOSS_EXTRUDE7_DEPTH)

    # Fillet2
    fillet2_edges = [part.edges().sort_by_distance(p)[0] for p in [
        (42.5, 49.058298297, 30),
        (42.5, 40.52718286, 30),
        (42.5, 40.52718286, -30),
        (42.5, 49.058298297, -30),
    ]]
    fillet(fillet2_edges, radius=FILLET2_R)

    # Sketch10 → Cut-Extrude5 (cut)
    with BuildSketch(Plane.ZY.offset(-37.5)):
        with Locations((0, 106)):
            Circle(SKETCH10_R)
        with Locations((35.507041555, 44.5)):
            Circle(SKETCH10_R)
        with Locations((-35.507041555, 44.5)):
            Circle(SKETCH10_R)
    extrude(amount=-CUT_EXTRUDE5_DEPTH, mode=Mode.SUBTRACT)

    # Chamfer1
    # the kernel refuses this chamfer: 10 mm, written as the material it adds along each edge
    with BuildSketch(Plane(origin=(37.5, 10, 30), x_dir=(0.027495876610586317, 0.9996219169112968, 0), z_dir=(0, 0, -1))) as chamfer1_piece_1_section:
        Polygon((CHAMFER1_SIZE * 0.999621916911, -CHAMFER1_SIZE * 0.0274958766106), (-CHAMFER1_SIZE * 0.0274958766106, -CHAMFER1_SIZE * 0.999621916911), (0, 0), align=None)
    chamfer1_piece_1 = extrude(amount=60, mode=Mode.PRIVATE)
    chamfer1_piece_1 = chamfer1_piece_1 - Plane(origin=(0, 13.349530392, 0), x_dir=(0, 0, 1), z_dir=(0, -1, 0)) * Cylinder(30, 160, mode=Mode.PRIVATE)
    add(chamfer1_piece_1)

    # Fillet3
    fillet3_edges = [part.edges().sort_by_distance(p)[0] for p in [
        (42.5, 40.52718286, 40),
        (42.5, 49.058298297, 40),
        (42.5, 49.058298297, -40),
        (42.5, 40.52718286, -40),
    ]]
    fillet(fillet3_edges, radius=FILLET3_R)


solid = part.part
